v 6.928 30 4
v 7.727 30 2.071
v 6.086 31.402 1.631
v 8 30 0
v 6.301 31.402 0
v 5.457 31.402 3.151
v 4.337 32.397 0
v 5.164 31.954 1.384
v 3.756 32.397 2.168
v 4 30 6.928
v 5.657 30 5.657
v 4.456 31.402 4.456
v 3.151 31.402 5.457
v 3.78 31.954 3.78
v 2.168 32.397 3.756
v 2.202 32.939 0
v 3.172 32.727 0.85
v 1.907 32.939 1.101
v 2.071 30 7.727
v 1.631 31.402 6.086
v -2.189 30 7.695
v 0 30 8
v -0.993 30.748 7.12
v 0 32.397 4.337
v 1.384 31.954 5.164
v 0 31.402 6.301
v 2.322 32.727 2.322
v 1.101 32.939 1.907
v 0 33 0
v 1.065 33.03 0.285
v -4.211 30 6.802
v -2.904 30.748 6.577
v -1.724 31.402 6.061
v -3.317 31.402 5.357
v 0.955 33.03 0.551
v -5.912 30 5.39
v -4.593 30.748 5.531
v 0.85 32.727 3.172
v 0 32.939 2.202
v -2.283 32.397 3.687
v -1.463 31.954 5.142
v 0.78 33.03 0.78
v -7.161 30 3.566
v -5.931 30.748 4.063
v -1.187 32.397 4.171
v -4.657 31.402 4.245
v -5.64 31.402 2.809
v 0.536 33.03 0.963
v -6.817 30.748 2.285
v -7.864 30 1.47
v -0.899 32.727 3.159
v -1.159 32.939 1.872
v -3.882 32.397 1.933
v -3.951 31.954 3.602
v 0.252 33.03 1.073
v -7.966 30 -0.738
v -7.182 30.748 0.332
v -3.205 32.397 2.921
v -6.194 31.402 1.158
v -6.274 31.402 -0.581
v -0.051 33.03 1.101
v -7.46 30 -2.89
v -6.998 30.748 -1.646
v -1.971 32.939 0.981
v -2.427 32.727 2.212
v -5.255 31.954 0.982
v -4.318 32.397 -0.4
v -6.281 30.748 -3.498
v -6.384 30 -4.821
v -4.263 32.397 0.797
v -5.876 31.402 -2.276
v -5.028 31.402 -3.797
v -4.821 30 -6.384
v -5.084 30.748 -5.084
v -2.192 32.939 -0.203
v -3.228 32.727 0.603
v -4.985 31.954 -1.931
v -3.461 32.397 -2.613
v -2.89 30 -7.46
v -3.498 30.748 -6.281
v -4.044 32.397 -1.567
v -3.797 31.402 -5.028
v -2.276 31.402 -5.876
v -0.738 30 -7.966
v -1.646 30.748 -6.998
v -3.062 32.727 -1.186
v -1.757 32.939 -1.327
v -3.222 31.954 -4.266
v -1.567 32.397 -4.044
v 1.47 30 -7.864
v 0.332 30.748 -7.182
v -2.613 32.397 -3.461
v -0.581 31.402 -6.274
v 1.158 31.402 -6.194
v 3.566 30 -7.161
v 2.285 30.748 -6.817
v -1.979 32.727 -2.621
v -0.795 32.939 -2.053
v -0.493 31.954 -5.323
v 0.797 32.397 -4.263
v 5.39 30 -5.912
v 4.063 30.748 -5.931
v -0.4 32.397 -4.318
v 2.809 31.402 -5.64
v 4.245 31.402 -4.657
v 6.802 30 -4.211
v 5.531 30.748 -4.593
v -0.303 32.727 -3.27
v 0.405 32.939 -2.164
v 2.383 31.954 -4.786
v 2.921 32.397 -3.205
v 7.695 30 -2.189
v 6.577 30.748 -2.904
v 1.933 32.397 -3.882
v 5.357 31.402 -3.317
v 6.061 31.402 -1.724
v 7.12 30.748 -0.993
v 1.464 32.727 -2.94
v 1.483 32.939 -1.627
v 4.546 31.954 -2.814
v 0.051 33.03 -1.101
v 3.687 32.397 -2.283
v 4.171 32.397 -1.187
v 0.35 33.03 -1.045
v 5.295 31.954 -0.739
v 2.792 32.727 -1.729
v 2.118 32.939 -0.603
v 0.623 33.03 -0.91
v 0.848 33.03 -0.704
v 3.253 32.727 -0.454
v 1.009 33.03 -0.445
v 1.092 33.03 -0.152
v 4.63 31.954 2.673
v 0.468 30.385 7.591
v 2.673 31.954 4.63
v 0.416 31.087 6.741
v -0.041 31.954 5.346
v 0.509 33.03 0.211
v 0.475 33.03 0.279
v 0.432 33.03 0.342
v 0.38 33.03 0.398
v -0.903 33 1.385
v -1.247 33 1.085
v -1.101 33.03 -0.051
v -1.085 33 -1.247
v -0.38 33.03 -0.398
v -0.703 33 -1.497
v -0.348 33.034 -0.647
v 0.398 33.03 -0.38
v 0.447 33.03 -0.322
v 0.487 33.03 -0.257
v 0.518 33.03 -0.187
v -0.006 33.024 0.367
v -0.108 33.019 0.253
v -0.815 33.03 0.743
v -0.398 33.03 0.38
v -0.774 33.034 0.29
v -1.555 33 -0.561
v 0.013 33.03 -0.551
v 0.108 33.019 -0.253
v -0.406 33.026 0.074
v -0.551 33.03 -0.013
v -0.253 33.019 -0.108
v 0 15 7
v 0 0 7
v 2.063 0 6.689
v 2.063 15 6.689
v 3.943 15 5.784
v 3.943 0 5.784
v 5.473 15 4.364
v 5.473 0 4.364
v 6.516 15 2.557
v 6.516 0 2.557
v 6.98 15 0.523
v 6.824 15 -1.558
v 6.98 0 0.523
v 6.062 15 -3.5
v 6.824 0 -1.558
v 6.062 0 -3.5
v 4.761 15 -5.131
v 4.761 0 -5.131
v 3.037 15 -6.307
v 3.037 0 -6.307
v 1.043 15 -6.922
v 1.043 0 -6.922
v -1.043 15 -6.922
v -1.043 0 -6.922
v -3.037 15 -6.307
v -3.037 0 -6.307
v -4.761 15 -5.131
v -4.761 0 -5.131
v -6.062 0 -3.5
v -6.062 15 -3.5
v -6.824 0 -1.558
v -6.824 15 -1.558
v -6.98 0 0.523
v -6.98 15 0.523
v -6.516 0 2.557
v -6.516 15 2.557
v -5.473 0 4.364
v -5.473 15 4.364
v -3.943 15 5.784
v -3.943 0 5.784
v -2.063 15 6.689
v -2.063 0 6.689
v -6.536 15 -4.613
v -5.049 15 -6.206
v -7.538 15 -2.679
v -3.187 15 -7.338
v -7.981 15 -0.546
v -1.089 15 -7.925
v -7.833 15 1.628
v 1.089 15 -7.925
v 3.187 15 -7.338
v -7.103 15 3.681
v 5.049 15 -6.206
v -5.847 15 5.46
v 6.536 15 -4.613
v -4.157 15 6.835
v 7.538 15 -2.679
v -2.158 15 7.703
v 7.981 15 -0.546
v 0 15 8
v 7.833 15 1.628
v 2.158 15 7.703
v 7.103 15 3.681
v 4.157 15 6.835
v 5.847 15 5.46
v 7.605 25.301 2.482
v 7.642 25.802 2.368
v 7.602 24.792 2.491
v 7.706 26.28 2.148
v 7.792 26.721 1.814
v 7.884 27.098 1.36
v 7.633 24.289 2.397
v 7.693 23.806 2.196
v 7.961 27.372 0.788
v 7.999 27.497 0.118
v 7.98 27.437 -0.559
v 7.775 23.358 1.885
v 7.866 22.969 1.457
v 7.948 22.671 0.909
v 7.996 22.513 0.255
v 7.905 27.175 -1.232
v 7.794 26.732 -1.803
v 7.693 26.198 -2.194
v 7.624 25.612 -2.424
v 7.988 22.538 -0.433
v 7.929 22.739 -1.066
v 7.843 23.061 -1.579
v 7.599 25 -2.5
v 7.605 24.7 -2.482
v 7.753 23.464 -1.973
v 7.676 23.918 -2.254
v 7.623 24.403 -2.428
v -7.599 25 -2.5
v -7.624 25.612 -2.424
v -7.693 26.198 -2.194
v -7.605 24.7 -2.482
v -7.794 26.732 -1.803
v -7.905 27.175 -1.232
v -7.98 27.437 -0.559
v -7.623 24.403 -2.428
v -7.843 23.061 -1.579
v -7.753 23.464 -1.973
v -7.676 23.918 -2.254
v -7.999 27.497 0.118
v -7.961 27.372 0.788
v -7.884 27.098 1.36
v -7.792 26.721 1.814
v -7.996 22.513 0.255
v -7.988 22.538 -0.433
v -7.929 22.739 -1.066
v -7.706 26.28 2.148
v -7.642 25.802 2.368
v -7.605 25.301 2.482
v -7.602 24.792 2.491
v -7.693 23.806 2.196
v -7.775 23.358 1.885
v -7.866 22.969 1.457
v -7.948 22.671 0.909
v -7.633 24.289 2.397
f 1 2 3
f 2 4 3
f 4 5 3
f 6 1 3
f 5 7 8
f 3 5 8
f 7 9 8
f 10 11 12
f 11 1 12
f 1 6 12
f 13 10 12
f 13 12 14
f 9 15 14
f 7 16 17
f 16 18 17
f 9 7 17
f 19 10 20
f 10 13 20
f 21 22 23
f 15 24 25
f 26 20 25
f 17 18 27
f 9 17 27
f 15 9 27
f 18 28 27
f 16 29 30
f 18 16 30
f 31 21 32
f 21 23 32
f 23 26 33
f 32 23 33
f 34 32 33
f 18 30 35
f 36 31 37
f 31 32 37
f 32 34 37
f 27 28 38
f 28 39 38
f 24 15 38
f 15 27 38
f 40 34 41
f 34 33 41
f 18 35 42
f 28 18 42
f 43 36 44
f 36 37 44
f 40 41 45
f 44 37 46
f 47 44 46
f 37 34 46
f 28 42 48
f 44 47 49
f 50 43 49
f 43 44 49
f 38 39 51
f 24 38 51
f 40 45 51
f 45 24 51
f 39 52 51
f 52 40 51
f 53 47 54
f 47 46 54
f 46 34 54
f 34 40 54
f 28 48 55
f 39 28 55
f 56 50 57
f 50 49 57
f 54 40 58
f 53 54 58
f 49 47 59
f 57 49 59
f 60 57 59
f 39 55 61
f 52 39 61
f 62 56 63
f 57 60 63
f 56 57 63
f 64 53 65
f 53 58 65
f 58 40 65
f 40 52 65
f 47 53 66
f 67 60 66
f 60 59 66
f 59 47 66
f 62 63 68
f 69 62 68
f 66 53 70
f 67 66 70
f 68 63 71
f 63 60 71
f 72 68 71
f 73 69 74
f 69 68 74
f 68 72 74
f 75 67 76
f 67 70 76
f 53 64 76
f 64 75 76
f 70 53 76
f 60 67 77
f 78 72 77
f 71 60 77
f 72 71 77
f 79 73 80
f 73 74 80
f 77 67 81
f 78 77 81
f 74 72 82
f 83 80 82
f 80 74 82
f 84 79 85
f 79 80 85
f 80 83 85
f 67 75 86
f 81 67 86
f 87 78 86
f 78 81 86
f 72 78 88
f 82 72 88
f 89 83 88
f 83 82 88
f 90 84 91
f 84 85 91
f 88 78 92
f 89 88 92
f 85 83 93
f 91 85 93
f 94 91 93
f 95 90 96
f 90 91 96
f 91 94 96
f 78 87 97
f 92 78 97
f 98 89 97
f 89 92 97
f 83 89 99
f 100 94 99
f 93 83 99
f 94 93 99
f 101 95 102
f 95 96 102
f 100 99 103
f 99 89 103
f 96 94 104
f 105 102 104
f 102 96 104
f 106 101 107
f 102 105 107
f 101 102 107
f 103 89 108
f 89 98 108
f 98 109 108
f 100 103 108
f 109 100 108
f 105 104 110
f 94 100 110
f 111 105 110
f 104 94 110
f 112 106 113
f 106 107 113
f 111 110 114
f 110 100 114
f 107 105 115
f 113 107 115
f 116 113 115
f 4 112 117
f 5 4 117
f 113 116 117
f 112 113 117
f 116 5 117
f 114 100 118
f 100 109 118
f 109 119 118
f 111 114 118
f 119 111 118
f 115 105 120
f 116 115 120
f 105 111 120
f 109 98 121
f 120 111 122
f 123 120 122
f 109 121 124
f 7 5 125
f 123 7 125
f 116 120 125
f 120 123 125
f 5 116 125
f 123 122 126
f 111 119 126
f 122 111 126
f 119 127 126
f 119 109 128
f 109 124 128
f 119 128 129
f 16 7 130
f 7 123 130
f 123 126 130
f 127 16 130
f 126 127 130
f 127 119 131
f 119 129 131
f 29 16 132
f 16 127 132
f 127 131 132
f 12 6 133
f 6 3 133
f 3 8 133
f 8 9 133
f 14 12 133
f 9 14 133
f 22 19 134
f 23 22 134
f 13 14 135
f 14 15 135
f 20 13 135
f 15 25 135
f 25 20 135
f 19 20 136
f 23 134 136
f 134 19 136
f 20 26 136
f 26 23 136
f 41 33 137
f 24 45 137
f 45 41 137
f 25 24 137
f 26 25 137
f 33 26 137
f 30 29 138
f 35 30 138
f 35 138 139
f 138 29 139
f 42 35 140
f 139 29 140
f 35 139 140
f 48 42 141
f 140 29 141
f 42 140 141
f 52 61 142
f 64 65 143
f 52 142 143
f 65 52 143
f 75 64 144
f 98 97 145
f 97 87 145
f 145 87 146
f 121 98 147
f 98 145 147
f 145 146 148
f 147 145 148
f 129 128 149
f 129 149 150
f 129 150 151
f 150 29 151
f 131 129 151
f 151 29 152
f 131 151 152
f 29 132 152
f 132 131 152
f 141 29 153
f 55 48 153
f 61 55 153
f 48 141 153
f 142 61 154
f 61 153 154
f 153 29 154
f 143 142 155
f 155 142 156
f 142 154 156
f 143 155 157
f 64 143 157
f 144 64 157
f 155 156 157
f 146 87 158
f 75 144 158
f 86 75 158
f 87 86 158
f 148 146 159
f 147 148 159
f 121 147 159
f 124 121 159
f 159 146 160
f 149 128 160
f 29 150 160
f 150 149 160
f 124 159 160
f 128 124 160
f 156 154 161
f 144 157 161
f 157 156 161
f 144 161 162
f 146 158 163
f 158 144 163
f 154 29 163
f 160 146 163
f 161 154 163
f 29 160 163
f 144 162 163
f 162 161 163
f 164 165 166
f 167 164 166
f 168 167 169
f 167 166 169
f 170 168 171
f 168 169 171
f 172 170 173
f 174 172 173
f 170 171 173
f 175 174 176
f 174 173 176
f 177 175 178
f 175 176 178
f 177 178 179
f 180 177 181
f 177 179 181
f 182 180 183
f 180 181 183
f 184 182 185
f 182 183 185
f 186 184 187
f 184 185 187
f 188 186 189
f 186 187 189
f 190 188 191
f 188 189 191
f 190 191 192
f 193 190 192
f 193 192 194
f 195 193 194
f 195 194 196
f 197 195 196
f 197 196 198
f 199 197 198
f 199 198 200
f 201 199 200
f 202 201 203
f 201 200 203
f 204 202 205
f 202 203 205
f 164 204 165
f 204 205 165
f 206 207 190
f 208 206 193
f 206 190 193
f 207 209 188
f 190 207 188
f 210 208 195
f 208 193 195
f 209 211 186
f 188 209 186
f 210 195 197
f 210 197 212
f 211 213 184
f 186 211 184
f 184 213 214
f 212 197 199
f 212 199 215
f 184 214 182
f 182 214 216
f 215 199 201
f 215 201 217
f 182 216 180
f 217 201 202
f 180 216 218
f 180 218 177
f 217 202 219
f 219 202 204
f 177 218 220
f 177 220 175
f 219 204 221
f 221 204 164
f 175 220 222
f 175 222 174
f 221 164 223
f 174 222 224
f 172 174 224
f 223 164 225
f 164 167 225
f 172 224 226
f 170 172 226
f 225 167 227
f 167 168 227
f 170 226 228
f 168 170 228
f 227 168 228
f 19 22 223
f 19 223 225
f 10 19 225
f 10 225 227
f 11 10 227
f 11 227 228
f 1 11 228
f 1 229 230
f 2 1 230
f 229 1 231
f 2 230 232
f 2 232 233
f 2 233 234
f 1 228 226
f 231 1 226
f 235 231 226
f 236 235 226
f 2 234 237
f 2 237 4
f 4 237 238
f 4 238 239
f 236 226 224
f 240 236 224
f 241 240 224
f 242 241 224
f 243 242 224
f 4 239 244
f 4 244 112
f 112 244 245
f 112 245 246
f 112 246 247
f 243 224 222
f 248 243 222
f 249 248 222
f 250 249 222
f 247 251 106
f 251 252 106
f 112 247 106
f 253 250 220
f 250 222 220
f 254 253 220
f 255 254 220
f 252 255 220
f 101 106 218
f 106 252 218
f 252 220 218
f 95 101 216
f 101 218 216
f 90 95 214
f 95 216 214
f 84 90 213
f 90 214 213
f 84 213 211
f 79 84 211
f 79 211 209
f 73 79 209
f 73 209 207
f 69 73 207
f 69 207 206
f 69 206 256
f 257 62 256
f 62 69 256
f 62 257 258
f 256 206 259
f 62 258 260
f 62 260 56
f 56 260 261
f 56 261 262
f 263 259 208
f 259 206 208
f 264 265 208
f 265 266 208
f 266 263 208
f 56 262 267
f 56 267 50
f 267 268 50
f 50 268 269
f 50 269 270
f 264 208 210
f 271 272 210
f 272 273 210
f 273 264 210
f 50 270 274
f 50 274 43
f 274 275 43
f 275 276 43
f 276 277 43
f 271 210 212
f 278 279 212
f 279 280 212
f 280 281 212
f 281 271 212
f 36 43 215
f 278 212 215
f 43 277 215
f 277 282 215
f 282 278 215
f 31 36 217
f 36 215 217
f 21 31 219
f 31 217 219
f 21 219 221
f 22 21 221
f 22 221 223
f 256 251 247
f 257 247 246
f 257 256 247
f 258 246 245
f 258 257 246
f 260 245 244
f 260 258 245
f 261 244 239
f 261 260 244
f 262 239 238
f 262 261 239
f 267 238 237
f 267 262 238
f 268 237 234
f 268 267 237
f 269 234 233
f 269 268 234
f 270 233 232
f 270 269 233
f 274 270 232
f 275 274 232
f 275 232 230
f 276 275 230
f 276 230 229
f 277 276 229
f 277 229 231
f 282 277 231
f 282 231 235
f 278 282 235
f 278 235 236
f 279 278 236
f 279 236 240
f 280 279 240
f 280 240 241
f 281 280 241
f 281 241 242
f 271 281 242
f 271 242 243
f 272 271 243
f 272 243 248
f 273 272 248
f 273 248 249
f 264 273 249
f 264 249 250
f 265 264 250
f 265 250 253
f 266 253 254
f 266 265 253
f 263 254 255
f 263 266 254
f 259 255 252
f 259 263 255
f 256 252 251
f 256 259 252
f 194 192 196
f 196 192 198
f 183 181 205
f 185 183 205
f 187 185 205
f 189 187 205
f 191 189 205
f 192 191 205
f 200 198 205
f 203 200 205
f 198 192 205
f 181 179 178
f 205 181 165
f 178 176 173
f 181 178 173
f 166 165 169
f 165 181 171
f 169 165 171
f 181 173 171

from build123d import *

# Parameters (mm, degrees)
SKETCH1_R               = 7
BOSS_EXTRUDE1_DEPTH     = 15
SKETCH2_R               = 8
BOSS_EXTRUDE2_DEPTH     = 15
CUT_EXTRUDE1_DEPTH      = 35.917798754
CUT_EXTRUDE1_DEPTH_BACK = 35.917798754
SKETCH3_R               = 2.5


with BuildPart() as part:
    # Sketch1 → Boss-Extrude1 (new body)
    with BuildSketch(Plane(origin=(0, 0, 0), x_dir=(1, 0, 0), z_dir=(0, 1, 0))):
        with Locations(Location((0, 0, 0), (0, 0, 270))):
            Circle(SKETCH1_R)
    extrude(amount=BOSS_EXTRUDE1_DEPTH)

    # Sketch2 → Boss-Extrude2 (add)
    with BuildSketch(Plane(origin=(0, 15, 0), x_dir=(1, 0, 0), z_dir=(0, 1, 0))):
        with Locations(Location((0, 0, 0), (0, 0, 270))):
            Circle(SKETCH2_R)
    extrude(amount=BOSS_EXTRUDE2_DEPTH)

    # Sketch4 → Revolve1 (revolve)
    with BuildSketch(Plane.XY):
        with BuildLine():
            Line((0, 33), (0, 30))
            Line((0, 30), (8, 30))
            ThreePointArc((8, 30), (4.336527008, 32.397405356), (0, 33))
        make_face()
    revolve(axis=Axis((0, 33, 0), (0, -1, 0)))

    # Sketch3 → Cut-Extrude1 (cut, two sides: drawn at the far end of the back side and taken through both)
    with BuildSketch(Plane(origin=(0, 0, 0), x_dir=(0, 0, -1), z_dir=(1, 0, 0)).offset(-CUT_EXTRUDE1_DEPTH_BACK)):
        with Locations((0, 25)):
            Circle(SKETCH3_R)
    extrude(amount=CUT_EXTRUDE1_DEPTH + CUT_EXTRUDE1_DEPTH_BACK, mode=Mode.SUBTRACT)


solid = part.part
